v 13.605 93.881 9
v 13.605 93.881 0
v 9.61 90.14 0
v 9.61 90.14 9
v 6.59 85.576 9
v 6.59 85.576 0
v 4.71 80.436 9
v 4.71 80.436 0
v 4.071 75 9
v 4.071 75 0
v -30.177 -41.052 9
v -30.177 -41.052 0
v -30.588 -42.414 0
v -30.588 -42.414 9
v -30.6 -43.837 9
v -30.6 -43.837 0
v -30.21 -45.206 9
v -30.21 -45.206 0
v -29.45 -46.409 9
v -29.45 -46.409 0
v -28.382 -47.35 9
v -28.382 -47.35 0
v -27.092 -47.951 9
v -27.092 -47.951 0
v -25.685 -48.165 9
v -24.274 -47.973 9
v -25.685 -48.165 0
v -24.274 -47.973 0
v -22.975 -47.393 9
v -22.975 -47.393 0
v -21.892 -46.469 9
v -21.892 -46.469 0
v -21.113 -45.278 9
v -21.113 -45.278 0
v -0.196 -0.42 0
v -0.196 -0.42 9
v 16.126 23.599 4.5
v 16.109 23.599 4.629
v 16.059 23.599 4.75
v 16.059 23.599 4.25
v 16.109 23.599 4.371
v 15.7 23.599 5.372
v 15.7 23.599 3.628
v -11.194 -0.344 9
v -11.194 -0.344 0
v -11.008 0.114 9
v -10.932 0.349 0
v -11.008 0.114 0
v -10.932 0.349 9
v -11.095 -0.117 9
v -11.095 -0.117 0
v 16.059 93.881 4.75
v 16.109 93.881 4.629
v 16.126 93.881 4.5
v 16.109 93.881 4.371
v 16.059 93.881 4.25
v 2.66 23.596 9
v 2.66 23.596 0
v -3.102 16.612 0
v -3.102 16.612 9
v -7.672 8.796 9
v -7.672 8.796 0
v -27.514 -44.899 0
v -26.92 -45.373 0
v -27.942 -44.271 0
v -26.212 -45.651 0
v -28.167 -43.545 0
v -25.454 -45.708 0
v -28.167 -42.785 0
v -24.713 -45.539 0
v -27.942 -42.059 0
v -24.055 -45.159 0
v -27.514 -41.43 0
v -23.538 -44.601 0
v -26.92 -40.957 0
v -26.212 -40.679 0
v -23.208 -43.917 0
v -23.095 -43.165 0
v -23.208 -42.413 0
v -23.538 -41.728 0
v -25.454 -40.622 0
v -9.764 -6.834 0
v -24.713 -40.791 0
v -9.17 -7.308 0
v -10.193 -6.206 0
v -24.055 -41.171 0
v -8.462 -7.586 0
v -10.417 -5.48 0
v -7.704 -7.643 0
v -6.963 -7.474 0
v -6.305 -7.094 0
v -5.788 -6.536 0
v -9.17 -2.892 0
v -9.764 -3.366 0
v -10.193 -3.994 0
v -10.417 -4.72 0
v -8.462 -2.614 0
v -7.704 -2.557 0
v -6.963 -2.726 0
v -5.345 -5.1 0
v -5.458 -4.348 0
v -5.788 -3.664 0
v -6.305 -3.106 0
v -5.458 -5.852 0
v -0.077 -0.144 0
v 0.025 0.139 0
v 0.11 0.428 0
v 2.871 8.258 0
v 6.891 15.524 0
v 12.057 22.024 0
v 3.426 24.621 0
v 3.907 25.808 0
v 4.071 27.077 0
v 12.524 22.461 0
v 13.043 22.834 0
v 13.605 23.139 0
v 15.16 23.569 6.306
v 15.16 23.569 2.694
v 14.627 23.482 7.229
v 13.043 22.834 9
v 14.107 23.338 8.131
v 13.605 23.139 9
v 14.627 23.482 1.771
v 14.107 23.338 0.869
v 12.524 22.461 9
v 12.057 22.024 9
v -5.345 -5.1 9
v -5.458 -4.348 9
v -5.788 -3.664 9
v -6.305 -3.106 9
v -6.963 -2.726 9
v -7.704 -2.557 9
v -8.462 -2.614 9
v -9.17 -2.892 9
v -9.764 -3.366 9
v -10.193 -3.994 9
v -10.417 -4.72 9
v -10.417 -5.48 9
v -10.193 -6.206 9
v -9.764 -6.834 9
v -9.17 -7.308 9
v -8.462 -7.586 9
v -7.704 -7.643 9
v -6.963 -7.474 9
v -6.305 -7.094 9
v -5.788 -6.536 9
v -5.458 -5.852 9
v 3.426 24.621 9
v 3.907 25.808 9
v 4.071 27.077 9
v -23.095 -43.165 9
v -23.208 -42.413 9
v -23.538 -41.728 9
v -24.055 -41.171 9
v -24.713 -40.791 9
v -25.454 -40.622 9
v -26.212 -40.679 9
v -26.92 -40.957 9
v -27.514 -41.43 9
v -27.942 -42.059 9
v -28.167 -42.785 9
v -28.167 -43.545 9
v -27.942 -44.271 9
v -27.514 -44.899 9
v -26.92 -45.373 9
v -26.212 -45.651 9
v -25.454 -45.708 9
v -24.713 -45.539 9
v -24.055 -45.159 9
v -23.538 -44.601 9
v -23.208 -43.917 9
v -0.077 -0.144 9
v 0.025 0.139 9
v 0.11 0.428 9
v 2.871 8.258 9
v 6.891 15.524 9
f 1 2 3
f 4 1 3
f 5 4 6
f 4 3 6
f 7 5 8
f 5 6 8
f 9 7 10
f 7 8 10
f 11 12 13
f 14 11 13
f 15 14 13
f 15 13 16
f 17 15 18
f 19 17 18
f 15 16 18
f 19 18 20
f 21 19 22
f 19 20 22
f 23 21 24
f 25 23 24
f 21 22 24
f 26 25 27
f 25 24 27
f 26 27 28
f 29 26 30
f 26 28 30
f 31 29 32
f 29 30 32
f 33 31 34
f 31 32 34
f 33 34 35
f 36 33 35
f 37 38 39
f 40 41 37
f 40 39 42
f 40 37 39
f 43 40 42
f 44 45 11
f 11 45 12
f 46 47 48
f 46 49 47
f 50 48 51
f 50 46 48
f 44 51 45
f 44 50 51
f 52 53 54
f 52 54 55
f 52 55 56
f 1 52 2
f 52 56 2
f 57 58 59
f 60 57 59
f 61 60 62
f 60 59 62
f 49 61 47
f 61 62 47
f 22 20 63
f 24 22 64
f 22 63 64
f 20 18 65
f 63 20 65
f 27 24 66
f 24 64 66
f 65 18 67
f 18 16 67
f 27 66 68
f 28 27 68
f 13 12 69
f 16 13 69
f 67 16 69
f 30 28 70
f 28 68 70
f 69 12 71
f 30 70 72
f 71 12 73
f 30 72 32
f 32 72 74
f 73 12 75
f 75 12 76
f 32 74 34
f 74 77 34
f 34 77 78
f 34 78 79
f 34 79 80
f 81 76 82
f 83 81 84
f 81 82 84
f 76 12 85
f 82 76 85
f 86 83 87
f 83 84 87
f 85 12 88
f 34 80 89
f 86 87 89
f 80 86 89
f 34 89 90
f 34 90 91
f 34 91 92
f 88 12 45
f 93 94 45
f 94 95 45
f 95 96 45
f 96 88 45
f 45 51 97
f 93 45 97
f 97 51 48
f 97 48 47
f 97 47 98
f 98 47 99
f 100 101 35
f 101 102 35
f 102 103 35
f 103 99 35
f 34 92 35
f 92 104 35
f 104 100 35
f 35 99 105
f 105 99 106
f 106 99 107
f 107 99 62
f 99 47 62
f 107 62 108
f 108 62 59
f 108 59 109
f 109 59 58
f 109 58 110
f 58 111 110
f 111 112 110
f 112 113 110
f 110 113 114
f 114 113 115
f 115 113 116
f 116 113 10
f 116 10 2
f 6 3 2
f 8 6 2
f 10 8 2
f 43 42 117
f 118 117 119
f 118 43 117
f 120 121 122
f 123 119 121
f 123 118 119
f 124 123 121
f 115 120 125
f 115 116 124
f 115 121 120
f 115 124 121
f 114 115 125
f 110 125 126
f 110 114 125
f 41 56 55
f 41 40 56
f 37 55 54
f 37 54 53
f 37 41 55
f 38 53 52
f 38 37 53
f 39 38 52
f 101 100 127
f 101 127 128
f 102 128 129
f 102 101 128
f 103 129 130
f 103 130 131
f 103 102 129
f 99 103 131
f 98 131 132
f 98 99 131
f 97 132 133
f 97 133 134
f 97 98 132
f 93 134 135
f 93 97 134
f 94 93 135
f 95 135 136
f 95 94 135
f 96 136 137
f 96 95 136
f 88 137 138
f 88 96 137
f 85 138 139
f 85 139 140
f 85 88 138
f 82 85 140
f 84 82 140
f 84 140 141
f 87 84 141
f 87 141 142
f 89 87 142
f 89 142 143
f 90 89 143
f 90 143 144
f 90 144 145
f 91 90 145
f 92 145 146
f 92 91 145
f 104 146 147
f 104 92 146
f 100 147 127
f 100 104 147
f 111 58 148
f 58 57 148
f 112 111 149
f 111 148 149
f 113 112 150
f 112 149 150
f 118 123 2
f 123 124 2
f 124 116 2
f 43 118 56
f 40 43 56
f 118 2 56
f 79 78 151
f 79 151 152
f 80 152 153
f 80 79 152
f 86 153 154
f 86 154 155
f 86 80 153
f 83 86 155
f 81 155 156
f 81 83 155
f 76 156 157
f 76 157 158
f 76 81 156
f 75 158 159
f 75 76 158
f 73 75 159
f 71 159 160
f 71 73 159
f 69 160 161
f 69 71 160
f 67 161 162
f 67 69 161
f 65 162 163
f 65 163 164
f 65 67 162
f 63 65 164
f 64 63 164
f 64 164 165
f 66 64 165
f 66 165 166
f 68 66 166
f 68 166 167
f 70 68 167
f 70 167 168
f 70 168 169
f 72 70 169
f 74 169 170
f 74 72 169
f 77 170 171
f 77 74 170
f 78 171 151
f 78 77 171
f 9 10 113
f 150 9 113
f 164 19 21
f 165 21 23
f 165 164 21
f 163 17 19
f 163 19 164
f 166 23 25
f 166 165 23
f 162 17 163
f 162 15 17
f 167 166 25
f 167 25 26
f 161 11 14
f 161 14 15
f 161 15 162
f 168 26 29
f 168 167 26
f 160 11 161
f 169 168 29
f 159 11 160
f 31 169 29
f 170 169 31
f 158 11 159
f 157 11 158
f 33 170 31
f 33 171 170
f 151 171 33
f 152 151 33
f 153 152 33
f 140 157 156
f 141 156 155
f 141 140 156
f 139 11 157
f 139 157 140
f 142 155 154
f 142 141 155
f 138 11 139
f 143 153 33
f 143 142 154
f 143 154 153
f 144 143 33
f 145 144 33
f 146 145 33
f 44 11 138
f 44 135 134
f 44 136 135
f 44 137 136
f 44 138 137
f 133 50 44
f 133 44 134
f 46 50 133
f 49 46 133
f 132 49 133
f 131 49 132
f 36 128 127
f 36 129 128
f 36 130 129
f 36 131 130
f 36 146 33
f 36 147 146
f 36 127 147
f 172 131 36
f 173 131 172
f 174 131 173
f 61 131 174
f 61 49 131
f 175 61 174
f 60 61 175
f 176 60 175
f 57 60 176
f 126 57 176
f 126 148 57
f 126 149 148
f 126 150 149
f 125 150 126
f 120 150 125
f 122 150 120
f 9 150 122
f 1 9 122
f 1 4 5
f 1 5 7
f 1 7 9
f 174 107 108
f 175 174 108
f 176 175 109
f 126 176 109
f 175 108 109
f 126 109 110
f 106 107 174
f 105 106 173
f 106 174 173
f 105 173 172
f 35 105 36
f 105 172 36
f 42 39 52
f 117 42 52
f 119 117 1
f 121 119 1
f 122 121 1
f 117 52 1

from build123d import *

# Parameters (mm, degrees)
SKETCH1_R           = 2.55
BOSS_EXTRUDE1_DEPTH = 9
SKETCH2_W           = 1.5
SKETCH2_H           = 71.301363943
CUT_EXTRUDE1_DEPTH  = 10
BOSS_EXTRUDE2_DEPTH = 70.2819
FILLET1_R           = 0.5
FILLET2_R           = 5


with BuildPart() as part:
    # Sketch1 → Boss-Extrude1 (new body)
    with BuildSketch(Plane.XY):
        with BuildLine():
            Line((-11.03377919, 0), (-30.17656458, -41.051835747))
            ThreePointArc((-30.17656458, -41.051835747), (-27.758116953, -47.696465991), (-21.113486709, -45.278018364))
            Line((-21.113486709, -45.278018364), (0, 0))
            ThreePointArc((0, 0), (5.686222606, 13.627582704), (15.104941349, 25))
            Line((15.104941349, 25), (15.104941349, 94.9))
            ThreePointArc((15.104941349, 94.9), (7.014188798, 86.377107313), (4.071162159, 75))
            Line((4.071162159, 75), (4.071162159, 25))
            ThreePointArc((4.071162159, 25), (-5.128820408, 13.495422821), (-11.03377919, 0))
        make_face()
        with Locations((-25.645025645, -43.164927056)):
            Circle(SKETCH1_R, mode=Mode.SUBTRACT)
        with Locations((-7.895058651, -5.1)):
            Circle(SKETCH1_R, mode=Mode.SUBTRACT)
    extrude(amount=BOSS_EXTRUDE1_DEPTH)

    # Sketch2 → Cut-Extrude1 (cut, through all)
    with BuildSketch(Plane.XY.offset(9)):
        with Locations((14.354941349, 59.249318028)):
            Rectangle(SKETCH2_W, SKETCH2_H)
    extrude(amount=-CUT_EXTRUDE1_DEPTH, mode=Mode.SUBTRACT)

    # Sketch4 → Boss-Extrude2 (add)
    with BuildSketch(Plane(origin=(0, 93.880535659, 0), x_dir=(0, 0, -1), z_dir=(0, -1, 0))):
        Polygon((0, 13.604941349), (-4.5, 16.20301756), (-9, 13.604941349), align=None)
    extrude(amount=BOSS_EXTRUDE2_DEPTH)

    # Fillet1
    fillet1_edges = [part.edges().sort_by_distance(p)[0] for p in [
        (16.20301756, 58.739585659, 4.5),
    ]]
    fillet(fillet1_edges, radius=FILLET1_R)

    # Fillet2
    fillet2_edges = [part.edges().sort_by_distance(p)[0] for p in [
        (0, 0, 4.5),
        (-11.03377919, 0, 4.5),
        (4.071162159, 25, 4.5),
        (13.604941349, 23.598636057, 4.5),
    ]]
    fillet(fillet2_edges, radius=FILLET2_R)


solid = part.part
